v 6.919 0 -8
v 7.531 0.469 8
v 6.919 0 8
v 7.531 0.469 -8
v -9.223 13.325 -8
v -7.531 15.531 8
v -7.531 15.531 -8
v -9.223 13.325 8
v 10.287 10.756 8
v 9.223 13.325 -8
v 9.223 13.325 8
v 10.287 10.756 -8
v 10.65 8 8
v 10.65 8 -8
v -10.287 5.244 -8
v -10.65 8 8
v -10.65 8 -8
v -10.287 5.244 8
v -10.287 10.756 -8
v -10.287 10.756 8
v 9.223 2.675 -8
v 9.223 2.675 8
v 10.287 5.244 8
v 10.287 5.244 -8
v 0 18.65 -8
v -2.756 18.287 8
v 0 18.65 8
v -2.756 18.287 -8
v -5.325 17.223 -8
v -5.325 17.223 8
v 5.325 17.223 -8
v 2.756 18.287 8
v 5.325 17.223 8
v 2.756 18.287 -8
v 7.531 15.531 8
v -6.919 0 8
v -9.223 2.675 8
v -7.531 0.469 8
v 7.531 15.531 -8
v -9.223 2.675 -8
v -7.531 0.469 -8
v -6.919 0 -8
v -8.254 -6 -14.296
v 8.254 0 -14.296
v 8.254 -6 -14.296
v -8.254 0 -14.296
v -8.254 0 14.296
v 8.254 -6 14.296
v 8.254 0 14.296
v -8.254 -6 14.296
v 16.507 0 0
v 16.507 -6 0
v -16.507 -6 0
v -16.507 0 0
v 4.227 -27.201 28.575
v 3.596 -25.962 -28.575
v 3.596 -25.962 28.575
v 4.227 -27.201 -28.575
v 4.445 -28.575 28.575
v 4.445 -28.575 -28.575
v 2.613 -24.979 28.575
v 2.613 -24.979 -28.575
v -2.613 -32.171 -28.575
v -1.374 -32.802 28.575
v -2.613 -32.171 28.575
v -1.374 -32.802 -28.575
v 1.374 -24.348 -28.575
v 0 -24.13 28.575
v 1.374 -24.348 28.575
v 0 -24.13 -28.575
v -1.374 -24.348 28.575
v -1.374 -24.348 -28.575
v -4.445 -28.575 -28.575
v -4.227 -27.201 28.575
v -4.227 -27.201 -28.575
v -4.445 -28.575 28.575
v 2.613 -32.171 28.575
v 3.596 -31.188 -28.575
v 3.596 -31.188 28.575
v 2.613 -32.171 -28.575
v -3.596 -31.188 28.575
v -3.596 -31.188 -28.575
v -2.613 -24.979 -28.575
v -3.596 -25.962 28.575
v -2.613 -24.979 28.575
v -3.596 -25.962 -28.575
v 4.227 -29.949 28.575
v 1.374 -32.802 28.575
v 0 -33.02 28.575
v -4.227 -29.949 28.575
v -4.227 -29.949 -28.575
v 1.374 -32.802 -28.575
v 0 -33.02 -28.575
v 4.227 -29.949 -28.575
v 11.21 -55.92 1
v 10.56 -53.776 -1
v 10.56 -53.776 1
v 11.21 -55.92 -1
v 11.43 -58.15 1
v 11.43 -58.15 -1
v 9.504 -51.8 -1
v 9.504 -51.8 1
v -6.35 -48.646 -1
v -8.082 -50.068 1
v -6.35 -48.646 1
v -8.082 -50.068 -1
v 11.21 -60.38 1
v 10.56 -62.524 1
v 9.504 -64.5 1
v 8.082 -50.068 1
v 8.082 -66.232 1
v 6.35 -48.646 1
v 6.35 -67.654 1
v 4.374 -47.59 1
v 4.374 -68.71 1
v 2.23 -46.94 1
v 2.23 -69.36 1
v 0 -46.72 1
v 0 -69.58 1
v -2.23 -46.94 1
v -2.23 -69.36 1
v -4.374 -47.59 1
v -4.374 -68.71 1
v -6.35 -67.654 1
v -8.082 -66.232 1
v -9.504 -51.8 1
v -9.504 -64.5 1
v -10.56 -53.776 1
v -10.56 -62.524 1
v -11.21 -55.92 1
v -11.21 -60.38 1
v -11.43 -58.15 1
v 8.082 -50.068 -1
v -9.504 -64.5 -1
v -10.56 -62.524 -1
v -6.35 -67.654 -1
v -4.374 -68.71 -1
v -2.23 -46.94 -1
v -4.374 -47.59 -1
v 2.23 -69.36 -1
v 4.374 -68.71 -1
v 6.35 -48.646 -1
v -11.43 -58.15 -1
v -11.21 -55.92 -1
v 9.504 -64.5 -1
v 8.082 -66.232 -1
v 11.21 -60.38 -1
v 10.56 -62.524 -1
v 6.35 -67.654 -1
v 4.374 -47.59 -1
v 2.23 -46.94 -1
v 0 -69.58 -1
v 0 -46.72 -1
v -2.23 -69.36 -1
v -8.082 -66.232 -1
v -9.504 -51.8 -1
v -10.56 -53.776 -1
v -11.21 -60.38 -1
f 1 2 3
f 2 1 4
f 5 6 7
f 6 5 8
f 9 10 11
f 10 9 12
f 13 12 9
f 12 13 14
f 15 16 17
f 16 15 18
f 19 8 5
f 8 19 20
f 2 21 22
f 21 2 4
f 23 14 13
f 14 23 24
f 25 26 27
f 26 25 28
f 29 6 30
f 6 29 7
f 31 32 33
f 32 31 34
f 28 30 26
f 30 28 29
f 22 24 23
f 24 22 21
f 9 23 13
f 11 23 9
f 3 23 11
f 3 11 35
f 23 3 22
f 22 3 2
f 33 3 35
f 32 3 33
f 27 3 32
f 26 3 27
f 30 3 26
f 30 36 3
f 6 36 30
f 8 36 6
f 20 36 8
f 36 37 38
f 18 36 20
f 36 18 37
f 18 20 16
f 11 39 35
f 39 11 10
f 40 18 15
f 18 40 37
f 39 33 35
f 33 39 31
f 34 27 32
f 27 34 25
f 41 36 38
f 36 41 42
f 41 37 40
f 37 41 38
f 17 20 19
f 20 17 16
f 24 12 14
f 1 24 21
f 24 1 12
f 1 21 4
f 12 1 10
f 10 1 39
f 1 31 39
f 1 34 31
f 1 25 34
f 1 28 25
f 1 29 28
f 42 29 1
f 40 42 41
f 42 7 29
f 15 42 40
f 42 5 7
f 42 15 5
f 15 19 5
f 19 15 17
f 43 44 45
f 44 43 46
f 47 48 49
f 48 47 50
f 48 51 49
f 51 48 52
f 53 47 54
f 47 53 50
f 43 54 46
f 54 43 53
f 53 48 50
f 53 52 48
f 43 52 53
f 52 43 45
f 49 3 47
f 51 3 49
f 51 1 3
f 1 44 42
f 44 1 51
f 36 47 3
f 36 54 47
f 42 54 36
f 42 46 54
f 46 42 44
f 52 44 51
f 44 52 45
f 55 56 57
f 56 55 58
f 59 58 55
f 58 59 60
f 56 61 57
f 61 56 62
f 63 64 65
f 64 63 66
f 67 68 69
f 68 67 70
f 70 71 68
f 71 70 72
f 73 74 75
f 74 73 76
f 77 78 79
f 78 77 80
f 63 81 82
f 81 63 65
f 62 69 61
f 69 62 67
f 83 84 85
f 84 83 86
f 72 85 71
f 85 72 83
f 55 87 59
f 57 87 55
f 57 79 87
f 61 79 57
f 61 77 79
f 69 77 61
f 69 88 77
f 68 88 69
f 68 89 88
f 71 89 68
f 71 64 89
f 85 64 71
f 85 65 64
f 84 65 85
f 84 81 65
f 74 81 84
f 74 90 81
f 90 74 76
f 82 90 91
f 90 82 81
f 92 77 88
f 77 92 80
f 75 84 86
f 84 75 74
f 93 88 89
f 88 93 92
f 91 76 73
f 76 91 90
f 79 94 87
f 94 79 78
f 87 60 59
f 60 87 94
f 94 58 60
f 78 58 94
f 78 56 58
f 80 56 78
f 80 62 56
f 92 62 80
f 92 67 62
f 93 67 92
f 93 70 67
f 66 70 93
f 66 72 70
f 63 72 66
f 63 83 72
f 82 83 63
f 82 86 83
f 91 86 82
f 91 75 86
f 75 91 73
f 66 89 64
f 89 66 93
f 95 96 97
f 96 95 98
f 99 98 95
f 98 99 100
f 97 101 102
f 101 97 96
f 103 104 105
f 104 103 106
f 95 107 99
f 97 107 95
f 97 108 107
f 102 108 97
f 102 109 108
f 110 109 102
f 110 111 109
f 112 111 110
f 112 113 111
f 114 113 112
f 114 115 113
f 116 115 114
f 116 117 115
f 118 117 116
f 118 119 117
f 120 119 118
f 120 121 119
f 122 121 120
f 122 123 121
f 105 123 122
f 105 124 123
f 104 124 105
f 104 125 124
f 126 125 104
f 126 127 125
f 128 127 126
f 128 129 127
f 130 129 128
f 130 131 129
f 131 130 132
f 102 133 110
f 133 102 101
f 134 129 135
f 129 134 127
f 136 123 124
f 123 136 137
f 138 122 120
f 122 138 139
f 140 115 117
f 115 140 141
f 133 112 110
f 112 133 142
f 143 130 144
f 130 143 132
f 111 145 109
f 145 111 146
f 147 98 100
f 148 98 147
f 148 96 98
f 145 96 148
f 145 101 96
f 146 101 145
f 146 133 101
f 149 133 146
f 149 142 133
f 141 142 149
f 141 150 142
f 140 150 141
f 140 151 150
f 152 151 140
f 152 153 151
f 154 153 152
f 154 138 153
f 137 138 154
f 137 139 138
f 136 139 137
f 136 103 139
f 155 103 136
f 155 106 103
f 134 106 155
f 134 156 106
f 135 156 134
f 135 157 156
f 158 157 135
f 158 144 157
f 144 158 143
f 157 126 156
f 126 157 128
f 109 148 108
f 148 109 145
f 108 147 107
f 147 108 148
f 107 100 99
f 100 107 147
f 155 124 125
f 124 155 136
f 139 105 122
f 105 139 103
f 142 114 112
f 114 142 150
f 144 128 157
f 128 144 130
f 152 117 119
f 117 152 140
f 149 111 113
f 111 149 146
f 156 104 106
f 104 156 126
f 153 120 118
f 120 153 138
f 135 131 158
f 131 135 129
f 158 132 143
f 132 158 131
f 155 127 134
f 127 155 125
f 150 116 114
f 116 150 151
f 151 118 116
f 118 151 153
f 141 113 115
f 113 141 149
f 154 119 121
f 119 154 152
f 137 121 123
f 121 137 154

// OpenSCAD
// Auto-generated by scripts/author_from_manifest.py (Phase D.3).
// Source: data/phase_d_manifest.json (sku_intent='tyco-ty3251-pendent-175f').
// Do not hand-edit — regenerate from the manifest.
//
// @part tyco_ty3251_pendent_175f
// @kind sprinkler_head
// @category head.pendant.k56
// @display-name "Tyco TY3251 Pendent K5.6 SR 175°F"
// @mfg tyco_fire_protection
// @mfg-pn TY3251
// @listing UL FM
// @hazard-classes LH OH1
// @price-usd 14.20
// @install-minutes 8
// @crew journeyman
// @k-factor 5.6
// @orientation pendant
// @response standard
// @temperature 175F
// @param size_in number default=0.5 label="Size" unit="in"
// @port inlet position=[0,0.014,0] direction=[0,1,0] style=NPT_threaded size_in=0.5 role=drop

size_in = 0.5;
k_factor = 5.6;

length_mm   = 57.15;
body_dia_mm = 25.40;
thread_od   = 21.3;
thread_len  = 16;
deflector_d = body_dia_mm * 0.9;

 union() {
    translate([0, thread_len/2, 0])
        cylinder(h = thread_len, d = thread_od, center = true, $fn = 24);
    translate([0, -3, 0])
        rotate([90, 0, 0])
        cylinder(h = 6, d = thread_od * 1.55, $fn = 6, center = true);
    translate([0, -length_mm/2, 0])
        cylinder(h = length_mm, d = body_dia_mm * 0.35, center = true, $fn = 20);
    translate([0, -length_mm - 1, 0])
        cylinder(h = 2, d = deflector_d, center = true, $fn = 32);
}
